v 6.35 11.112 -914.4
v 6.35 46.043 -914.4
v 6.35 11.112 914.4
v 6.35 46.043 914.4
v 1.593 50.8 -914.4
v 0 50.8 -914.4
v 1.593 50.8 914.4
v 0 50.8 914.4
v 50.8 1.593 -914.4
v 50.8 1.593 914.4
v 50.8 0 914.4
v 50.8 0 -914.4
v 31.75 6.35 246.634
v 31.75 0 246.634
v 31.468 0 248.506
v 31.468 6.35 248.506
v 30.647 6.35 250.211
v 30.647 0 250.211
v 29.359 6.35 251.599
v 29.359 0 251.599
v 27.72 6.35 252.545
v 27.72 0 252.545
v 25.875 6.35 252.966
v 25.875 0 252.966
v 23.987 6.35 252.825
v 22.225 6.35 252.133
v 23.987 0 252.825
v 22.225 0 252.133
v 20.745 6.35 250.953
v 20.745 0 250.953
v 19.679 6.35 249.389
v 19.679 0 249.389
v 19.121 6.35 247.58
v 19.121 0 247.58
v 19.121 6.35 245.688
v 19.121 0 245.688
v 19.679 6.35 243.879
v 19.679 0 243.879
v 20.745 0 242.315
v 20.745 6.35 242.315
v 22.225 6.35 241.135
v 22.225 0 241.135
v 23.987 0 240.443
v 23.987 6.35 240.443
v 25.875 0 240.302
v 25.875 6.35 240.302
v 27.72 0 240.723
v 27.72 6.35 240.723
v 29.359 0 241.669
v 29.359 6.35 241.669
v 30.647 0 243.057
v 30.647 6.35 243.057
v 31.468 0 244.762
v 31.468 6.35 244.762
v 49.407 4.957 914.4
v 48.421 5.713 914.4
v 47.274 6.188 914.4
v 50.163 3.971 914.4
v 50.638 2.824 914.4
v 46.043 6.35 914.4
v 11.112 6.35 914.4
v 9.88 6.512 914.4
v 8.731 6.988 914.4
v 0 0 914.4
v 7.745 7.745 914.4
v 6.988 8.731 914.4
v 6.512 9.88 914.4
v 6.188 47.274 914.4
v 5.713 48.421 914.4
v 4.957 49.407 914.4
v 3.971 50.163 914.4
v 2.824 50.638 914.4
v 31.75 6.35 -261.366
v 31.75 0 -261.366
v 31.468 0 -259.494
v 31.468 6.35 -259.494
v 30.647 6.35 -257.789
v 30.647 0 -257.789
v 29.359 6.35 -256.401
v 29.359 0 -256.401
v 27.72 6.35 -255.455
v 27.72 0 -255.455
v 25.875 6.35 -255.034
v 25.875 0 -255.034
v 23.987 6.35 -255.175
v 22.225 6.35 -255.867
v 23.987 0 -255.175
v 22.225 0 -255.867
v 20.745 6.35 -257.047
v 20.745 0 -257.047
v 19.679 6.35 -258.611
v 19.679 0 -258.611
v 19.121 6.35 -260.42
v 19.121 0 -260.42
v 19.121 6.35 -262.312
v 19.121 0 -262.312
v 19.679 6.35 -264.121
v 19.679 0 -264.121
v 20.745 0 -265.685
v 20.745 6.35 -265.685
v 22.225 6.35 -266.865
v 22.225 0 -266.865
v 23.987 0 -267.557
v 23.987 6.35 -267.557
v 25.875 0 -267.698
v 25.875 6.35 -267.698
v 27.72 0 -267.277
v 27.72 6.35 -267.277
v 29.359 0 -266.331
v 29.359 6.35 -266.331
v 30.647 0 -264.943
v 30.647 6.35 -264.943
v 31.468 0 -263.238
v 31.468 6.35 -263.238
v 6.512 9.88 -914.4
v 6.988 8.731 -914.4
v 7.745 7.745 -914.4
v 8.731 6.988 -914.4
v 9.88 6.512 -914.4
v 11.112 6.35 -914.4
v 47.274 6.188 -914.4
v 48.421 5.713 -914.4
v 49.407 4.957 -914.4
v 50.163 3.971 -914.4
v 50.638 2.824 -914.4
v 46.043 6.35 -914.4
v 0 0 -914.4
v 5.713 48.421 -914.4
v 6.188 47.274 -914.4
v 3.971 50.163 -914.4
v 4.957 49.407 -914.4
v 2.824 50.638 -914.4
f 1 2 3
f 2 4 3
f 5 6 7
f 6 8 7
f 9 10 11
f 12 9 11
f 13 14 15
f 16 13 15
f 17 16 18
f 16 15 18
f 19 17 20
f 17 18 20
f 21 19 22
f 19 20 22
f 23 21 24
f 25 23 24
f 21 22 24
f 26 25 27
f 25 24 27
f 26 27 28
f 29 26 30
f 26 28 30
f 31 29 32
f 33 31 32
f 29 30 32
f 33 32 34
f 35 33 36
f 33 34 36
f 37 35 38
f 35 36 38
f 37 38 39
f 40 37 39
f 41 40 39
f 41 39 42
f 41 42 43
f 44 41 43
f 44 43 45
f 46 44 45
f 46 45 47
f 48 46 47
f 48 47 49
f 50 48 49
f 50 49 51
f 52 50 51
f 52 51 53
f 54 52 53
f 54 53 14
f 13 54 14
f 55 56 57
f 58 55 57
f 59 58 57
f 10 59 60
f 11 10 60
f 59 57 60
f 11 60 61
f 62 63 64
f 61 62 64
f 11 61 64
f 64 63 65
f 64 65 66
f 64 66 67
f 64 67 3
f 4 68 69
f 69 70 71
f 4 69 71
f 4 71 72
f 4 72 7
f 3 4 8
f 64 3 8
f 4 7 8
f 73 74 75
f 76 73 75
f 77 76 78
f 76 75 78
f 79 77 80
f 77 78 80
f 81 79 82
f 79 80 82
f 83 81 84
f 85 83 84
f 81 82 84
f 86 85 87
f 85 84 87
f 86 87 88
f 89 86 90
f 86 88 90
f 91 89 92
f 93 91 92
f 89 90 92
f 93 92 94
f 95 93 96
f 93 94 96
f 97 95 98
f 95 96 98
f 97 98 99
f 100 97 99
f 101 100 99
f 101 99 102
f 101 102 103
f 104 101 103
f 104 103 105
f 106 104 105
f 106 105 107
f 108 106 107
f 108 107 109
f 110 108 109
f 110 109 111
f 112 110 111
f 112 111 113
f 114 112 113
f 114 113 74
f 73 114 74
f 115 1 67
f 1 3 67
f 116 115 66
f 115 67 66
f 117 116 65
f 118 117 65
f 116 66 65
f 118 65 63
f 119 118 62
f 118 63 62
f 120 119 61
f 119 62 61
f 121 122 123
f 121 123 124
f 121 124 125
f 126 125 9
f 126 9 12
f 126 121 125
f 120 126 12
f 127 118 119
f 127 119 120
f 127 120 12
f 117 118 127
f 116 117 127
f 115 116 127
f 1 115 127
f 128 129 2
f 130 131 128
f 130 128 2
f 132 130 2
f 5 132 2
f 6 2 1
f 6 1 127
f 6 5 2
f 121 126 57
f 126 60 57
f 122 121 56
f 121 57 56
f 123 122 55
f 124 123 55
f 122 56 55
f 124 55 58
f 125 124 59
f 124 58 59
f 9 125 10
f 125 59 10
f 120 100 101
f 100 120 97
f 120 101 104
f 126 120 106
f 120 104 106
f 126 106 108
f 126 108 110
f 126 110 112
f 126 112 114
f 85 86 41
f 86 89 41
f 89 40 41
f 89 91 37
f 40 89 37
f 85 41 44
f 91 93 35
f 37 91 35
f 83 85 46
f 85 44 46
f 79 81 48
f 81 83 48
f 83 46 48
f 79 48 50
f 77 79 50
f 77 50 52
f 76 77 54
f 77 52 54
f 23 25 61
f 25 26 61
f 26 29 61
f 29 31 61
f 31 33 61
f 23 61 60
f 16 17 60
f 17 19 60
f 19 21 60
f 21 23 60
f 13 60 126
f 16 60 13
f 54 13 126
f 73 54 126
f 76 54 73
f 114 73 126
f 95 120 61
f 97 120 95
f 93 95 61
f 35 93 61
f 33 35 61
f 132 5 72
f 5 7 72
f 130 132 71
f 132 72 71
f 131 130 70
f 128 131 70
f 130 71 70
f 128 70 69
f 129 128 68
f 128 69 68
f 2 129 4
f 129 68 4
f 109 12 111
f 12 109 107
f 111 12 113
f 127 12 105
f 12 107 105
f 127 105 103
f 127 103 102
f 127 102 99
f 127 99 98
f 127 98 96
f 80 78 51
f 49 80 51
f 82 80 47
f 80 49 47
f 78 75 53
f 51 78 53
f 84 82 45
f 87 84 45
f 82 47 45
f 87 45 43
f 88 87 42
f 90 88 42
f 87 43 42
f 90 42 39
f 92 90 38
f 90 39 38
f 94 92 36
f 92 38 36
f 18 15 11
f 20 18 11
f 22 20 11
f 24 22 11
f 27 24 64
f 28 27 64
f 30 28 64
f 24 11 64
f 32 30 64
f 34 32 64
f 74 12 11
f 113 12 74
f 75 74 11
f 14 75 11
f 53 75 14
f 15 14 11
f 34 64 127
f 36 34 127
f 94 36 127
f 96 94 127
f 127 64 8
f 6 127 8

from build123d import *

# Parameters (mm, degrees)
BOSS_EXTRUDE1_DEPTH = 914.4
CUT_EXTRUDE2_REACH  = 52.8
SKETCH5_R           = 6.35


with BuildPart() as part:
    # Sketch1 → Boss-Extrude1 (new body, symmetric)
    with BuildSketch(Plane.XY):
        with BuildLine():
            Line((0, 0), (0, 50.8))
            Line((0, 50.8), (1.59258, 50.8))
            ThreePointArc((1.59258, 50.8), (4.956583943, 49.406583943), (6.35, 46.04258))
            Line((6.35, 46.04258), (6.35, 11.1125))
            ThreePointArc((6.35, 11.1125), (7.744903955, 7.744903955), (11.1125, 6.35))
            Line((11.1125, 6.35), (46.04258, 6.35))
            ThreePointArc((46.04258, 6.35), (49.406583943, 4.956583943), (50.8, 1.59258))
            Line((50.8, 1.59258), (50.8, 0))
            Line((50.8, 0), (0, 0))
        make_face()
    extrude(amount=BOSS_EXTRUDE1_DEPTH, both=True)

    # Sketch5 → Cut-Extrude2 (cut, up to next)
    with BuildSketch(Plane.XZ, mode=Mode.PRIVATE) as cut_extrude2_sk1:
        with Locations((25.4, -261.366)):
            Circle(SKETCH5_R)
    cut_extrude2_tool1 = extrude(cut_extrude2_sk1.sketch, amount=-CUT_EXTRUDE2_REACH, mode=Mode.PRIVATE) & part.part
    add(cut_extrude2_tool1.solids().sort_by_distance((25.4, 0, -261.366))[0], mode=Mode.SUBTRACT)
    # Sketch5 → Cut-Extrude2 (cut, up to next)
    with BuildSketch(Plane.XZ, mode=Mode.PRIVATE) as cut_extrude2_sk2:
        with Locations((25.4, 246.634)):
            Circle(SKETCH5_R)
    cut_extrude2_tool2 = extrude(cut_extrude2_sk2.sketch, amount=-CUT_EXTRUDE2_REACH, mode=Mode.PRIVATE) & part.part
    add(cut_extrude2_tool2.solids().sort_by_distance((25.4, 0, 246.634))[0], mode=Mode.SUBTRACT)


solid = part.part
